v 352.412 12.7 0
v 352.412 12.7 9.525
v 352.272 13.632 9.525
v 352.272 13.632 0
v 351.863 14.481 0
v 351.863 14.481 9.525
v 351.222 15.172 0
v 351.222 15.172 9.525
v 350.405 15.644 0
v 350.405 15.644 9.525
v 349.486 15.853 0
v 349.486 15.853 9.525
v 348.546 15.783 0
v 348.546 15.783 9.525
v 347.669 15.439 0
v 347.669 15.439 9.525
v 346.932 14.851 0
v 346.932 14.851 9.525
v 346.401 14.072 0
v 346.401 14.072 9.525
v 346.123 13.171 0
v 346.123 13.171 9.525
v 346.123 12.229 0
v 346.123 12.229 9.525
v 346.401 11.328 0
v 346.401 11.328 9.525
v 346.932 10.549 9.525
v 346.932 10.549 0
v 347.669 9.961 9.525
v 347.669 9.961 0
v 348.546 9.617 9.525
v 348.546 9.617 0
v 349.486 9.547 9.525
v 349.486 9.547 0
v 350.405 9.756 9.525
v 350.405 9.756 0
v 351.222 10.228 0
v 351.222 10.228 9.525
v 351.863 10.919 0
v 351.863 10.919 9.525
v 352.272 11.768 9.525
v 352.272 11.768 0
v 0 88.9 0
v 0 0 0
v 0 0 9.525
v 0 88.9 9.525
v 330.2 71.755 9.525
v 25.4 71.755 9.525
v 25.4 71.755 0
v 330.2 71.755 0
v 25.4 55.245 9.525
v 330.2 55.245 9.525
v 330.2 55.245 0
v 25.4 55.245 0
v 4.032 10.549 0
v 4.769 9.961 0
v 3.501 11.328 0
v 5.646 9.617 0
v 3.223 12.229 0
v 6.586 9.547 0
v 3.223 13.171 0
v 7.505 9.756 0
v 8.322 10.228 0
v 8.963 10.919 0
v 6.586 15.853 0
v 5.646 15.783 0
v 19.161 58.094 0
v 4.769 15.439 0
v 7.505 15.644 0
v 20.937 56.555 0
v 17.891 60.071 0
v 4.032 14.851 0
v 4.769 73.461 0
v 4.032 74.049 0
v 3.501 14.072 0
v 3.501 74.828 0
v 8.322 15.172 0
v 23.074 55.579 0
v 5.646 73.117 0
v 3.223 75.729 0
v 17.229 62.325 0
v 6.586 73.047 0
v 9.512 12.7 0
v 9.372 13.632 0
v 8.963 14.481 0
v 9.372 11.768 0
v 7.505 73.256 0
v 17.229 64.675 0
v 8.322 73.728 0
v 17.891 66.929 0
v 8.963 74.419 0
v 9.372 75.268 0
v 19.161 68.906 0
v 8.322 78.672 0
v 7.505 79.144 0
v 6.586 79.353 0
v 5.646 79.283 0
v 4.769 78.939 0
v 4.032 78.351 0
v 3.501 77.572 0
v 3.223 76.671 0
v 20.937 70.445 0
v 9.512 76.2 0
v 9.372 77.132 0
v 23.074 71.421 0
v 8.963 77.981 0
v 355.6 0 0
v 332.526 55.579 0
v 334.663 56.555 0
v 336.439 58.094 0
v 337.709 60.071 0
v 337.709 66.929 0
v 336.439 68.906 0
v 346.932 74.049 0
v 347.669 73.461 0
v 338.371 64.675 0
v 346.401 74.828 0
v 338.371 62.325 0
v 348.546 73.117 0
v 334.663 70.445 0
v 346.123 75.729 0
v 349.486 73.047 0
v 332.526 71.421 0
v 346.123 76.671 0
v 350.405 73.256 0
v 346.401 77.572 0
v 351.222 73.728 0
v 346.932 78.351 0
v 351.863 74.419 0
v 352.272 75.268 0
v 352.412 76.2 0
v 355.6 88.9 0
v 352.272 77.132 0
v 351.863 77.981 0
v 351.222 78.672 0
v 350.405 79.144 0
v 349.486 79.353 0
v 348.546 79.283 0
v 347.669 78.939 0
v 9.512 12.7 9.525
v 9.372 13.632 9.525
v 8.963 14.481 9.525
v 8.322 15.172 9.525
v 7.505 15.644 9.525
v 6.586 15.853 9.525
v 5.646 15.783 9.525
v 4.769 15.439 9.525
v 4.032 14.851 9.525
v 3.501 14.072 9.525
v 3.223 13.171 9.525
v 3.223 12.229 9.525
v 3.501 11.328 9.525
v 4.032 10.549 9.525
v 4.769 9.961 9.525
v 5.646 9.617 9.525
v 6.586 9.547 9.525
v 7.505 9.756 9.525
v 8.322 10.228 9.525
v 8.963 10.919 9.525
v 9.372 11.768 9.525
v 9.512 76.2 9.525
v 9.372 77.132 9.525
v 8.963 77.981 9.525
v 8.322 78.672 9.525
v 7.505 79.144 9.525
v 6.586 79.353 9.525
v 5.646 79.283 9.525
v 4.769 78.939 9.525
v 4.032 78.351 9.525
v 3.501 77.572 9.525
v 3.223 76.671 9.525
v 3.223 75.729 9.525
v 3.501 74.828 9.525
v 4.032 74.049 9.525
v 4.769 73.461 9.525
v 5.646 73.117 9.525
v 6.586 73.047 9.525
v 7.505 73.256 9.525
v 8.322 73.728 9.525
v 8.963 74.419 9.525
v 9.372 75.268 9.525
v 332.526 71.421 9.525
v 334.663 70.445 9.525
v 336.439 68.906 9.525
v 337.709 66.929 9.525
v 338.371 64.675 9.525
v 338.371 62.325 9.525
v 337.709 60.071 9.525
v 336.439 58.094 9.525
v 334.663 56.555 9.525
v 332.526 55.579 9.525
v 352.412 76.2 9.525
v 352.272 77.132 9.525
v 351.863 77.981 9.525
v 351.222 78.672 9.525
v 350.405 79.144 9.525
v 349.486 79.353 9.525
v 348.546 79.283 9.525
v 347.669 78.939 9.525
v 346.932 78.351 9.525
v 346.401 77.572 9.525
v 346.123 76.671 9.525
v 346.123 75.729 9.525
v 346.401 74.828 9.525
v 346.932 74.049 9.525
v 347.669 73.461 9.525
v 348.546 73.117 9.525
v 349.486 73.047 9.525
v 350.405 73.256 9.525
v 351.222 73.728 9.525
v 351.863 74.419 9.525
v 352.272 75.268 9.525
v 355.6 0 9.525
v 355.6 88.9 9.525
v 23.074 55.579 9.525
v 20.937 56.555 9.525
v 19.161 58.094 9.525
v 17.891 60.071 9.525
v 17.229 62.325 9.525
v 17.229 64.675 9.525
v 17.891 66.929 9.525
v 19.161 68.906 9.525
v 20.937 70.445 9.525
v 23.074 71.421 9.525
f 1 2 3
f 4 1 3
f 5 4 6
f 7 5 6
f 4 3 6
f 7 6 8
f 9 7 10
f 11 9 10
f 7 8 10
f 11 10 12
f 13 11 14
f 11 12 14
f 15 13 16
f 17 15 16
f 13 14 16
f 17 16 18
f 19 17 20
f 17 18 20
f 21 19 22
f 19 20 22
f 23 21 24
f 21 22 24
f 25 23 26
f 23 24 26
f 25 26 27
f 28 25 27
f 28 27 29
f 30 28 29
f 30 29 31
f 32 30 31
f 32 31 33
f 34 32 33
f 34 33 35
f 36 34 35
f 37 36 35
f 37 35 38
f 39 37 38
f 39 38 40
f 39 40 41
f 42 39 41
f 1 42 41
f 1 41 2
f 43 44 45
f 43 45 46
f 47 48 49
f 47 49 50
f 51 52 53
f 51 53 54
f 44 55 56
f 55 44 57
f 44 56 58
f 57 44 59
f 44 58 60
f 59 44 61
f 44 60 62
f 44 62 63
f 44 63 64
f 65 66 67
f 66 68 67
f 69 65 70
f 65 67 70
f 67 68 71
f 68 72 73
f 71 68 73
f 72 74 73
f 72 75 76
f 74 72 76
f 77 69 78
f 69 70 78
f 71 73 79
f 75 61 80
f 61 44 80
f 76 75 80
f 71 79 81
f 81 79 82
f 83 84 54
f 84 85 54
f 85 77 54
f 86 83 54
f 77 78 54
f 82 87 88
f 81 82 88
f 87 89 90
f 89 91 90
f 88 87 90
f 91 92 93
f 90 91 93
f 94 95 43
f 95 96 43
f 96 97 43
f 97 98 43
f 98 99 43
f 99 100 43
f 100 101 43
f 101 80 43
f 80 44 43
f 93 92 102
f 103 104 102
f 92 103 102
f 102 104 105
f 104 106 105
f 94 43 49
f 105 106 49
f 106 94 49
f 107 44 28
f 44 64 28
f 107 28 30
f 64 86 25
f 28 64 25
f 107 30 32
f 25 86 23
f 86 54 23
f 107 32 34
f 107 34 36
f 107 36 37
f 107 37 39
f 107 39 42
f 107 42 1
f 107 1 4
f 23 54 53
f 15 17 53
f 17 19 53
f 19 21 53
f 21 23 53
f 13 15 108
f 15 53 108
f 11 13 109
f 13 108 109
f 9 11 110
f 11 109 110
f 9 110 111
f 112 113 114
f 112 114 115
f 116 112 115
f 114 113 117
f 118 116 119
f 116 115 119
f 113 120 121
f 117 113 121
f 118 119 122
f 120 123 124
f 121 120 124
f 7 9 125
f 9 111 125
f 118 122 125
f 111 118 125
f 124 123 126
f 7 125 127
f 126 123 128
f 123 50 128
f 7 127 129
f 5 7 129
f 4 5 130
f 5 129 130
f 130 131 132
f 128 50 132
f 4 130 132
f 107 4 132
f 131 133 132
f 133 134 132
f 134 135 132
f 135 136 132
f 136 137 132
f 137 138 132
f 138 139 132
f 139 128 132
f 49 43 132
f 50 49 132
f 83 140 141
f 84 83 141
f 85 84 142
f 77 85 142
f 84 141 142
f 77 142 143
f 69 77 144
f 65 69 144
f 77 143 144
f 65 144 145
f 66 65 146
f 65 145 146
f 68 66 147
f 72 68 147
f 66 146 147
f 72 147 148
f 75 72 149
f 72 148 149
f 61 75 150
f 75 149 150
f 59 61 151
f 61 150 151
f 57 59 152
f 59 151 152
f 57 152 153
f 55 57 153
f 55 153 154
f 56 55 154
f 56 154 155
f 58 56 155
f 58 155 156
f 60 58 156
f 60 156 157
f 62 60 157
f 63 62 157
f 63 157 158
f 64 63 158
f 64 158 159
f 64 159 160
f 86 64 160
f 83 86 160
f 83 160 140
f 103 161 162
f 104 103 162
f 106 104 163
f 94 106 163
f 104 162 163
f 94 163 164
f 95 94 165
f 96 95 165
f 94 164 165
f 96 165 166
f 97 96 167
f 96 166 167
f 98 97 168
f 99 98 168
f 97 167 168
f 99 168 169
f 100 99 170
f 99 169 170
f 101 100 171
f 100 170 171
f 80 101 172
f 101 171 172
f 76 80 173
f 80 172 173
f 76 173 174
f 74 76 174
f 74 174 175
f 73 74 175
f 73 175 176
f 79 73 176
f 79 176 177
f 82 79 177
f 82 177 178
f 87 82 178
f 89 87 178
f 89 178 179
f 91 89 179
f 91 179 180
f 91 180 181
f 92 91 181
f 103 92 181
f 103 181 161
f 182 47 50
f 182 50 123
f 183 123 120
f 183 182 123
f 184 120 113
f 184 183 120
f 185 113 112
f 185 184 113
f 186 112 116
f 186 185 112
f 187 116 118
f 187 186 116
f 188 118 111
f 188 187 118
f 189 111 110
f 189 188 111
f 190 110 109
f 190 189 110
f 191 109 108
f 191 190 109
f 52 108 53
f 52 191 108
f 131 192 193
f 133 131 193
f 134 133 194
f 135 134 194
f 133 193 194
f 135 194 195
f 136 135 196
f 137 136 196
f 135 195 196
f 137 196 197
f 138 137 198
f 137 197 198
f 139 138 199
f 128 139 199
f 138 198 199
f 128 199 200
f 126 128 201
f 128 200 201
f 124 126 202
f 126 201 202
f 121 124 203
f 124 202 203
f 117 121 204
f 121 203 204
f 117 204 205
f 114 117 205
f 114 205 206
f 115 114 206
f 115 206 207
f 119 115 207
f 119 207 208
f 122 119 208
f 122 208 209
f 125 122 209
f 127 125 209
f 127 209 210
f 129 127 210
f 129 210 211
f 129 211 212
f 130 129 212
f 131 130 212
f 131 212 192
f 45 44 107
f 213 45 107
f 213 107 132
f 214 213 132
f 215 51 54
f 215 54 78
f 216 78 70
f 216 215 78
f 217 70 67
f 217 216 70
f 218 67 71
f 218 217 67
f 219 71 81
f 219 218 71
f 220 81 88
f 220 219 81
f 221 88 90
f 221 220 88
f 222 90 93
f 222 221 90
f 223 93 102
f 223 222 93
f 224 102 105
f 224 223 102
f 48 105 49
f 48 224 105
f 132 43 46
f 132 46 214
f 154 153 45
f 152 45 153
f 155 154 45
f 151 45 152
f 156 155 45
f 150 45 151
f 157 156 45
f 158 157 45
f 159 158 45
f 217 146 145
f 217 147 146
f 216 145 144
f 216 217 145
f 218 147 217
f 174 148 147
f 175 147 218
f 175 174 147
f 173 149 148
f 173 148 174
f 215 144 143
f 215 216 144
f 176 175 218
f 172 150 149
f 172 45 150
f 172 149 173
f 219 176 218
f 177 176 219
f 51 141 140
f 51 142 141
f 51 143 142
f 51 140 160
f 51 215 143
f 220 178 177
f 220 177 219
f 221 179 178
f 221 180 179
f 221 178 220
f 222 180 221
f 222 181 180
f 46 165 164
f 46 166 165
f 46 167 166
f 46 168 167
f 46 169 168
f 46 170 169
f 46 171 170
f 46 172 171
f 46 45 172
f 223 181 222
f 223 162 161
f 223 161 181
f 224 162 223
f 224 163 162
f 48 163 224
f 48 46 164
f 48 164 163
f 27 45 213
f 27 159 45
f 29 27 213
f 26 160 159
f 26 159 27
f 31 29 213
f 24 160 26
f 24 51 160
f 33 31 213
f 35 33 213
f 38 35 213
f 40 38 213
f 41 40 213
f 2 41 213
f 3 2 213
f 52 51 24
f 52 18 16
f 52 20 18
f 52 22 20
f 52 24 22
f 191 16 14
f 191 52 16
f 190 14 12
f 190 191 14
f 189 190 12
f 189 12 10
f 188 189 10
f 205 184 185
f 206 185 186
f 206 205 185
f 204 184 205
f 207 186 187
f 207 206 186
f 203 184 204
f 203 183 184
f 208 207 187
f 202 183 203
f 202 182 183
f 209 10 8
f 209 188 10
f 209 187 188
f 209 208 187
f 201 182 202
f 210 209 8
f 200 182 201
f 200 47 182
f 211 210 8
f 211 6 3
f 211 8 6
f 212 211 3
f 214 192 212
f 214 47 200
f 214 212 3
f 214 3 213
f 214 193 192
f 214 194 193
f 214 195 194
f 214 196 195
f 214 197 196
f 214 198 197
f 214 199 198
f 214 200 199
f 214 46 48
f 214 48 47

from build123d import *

# Parameters (mm, degrees)
SKETCH1_W           = 355.6
SKETCH1_H           = 88.9
BOSS_EXTRUDE1_DEPTH = 9.525
SKETCH2_R           = 3.1623
CUT_EXTRUDE1_DEPTH  = 367.667827366
CUT_EXTRUDE2_DEPTH  = 367.667827366


with BuildPart() as part:
    # Sketch1 → Boss-Extrude1 (new body)
    with BuildSketch(Plane.XY):
        with Locations((177.8, 44.45)):
            Rectangle(SKETCH1_W, SKETCH1_H)
    extrude(amount=BOSS_EXTRUDE1_DEPTH)

    # Sketch2 → Cut-Extrude1 (cut, through all)
    with BuildSketch(Plane.XY.offset(9.525)):
        with Locations((6.35, 76.2)):
            Circle(SKETCH2_R)
        with Locations((6.35, 12.7)):
            Circle(SKETCH2_R)
        with Locations((349.25, 76.2)):
            Circle(SKETCH2_R)
        with Locations((349.25, 12.7)):
            Circle(SKETCH2_R)
    extrude(amount=-CUT_EXTRUDE1_DEPTH, mode=Mode.SUBTRACT)

    # Sketch3 → Cut-Extrude2 (cut, through all)
    with BuildSketch(Plane.XY.offset(9.525)):
        with BuildLine():
            Line((25.4, 71.755), (330.2, 71.755))
            ThreePointArc((330.2, 71.755), (338.455, 63.5), (330.2, 55.245))
            Line((330.2, 55.245), (25.4, 55.245))
            ThreePointArc((25.4, 55.245), (17.145, 63.5), (25.4, 71.755))
        make_face()
    extrude(amount=-CUT_EXTRUDE2_DEPTH, mode=Mode.SUBTRACT)


solid = part.part
